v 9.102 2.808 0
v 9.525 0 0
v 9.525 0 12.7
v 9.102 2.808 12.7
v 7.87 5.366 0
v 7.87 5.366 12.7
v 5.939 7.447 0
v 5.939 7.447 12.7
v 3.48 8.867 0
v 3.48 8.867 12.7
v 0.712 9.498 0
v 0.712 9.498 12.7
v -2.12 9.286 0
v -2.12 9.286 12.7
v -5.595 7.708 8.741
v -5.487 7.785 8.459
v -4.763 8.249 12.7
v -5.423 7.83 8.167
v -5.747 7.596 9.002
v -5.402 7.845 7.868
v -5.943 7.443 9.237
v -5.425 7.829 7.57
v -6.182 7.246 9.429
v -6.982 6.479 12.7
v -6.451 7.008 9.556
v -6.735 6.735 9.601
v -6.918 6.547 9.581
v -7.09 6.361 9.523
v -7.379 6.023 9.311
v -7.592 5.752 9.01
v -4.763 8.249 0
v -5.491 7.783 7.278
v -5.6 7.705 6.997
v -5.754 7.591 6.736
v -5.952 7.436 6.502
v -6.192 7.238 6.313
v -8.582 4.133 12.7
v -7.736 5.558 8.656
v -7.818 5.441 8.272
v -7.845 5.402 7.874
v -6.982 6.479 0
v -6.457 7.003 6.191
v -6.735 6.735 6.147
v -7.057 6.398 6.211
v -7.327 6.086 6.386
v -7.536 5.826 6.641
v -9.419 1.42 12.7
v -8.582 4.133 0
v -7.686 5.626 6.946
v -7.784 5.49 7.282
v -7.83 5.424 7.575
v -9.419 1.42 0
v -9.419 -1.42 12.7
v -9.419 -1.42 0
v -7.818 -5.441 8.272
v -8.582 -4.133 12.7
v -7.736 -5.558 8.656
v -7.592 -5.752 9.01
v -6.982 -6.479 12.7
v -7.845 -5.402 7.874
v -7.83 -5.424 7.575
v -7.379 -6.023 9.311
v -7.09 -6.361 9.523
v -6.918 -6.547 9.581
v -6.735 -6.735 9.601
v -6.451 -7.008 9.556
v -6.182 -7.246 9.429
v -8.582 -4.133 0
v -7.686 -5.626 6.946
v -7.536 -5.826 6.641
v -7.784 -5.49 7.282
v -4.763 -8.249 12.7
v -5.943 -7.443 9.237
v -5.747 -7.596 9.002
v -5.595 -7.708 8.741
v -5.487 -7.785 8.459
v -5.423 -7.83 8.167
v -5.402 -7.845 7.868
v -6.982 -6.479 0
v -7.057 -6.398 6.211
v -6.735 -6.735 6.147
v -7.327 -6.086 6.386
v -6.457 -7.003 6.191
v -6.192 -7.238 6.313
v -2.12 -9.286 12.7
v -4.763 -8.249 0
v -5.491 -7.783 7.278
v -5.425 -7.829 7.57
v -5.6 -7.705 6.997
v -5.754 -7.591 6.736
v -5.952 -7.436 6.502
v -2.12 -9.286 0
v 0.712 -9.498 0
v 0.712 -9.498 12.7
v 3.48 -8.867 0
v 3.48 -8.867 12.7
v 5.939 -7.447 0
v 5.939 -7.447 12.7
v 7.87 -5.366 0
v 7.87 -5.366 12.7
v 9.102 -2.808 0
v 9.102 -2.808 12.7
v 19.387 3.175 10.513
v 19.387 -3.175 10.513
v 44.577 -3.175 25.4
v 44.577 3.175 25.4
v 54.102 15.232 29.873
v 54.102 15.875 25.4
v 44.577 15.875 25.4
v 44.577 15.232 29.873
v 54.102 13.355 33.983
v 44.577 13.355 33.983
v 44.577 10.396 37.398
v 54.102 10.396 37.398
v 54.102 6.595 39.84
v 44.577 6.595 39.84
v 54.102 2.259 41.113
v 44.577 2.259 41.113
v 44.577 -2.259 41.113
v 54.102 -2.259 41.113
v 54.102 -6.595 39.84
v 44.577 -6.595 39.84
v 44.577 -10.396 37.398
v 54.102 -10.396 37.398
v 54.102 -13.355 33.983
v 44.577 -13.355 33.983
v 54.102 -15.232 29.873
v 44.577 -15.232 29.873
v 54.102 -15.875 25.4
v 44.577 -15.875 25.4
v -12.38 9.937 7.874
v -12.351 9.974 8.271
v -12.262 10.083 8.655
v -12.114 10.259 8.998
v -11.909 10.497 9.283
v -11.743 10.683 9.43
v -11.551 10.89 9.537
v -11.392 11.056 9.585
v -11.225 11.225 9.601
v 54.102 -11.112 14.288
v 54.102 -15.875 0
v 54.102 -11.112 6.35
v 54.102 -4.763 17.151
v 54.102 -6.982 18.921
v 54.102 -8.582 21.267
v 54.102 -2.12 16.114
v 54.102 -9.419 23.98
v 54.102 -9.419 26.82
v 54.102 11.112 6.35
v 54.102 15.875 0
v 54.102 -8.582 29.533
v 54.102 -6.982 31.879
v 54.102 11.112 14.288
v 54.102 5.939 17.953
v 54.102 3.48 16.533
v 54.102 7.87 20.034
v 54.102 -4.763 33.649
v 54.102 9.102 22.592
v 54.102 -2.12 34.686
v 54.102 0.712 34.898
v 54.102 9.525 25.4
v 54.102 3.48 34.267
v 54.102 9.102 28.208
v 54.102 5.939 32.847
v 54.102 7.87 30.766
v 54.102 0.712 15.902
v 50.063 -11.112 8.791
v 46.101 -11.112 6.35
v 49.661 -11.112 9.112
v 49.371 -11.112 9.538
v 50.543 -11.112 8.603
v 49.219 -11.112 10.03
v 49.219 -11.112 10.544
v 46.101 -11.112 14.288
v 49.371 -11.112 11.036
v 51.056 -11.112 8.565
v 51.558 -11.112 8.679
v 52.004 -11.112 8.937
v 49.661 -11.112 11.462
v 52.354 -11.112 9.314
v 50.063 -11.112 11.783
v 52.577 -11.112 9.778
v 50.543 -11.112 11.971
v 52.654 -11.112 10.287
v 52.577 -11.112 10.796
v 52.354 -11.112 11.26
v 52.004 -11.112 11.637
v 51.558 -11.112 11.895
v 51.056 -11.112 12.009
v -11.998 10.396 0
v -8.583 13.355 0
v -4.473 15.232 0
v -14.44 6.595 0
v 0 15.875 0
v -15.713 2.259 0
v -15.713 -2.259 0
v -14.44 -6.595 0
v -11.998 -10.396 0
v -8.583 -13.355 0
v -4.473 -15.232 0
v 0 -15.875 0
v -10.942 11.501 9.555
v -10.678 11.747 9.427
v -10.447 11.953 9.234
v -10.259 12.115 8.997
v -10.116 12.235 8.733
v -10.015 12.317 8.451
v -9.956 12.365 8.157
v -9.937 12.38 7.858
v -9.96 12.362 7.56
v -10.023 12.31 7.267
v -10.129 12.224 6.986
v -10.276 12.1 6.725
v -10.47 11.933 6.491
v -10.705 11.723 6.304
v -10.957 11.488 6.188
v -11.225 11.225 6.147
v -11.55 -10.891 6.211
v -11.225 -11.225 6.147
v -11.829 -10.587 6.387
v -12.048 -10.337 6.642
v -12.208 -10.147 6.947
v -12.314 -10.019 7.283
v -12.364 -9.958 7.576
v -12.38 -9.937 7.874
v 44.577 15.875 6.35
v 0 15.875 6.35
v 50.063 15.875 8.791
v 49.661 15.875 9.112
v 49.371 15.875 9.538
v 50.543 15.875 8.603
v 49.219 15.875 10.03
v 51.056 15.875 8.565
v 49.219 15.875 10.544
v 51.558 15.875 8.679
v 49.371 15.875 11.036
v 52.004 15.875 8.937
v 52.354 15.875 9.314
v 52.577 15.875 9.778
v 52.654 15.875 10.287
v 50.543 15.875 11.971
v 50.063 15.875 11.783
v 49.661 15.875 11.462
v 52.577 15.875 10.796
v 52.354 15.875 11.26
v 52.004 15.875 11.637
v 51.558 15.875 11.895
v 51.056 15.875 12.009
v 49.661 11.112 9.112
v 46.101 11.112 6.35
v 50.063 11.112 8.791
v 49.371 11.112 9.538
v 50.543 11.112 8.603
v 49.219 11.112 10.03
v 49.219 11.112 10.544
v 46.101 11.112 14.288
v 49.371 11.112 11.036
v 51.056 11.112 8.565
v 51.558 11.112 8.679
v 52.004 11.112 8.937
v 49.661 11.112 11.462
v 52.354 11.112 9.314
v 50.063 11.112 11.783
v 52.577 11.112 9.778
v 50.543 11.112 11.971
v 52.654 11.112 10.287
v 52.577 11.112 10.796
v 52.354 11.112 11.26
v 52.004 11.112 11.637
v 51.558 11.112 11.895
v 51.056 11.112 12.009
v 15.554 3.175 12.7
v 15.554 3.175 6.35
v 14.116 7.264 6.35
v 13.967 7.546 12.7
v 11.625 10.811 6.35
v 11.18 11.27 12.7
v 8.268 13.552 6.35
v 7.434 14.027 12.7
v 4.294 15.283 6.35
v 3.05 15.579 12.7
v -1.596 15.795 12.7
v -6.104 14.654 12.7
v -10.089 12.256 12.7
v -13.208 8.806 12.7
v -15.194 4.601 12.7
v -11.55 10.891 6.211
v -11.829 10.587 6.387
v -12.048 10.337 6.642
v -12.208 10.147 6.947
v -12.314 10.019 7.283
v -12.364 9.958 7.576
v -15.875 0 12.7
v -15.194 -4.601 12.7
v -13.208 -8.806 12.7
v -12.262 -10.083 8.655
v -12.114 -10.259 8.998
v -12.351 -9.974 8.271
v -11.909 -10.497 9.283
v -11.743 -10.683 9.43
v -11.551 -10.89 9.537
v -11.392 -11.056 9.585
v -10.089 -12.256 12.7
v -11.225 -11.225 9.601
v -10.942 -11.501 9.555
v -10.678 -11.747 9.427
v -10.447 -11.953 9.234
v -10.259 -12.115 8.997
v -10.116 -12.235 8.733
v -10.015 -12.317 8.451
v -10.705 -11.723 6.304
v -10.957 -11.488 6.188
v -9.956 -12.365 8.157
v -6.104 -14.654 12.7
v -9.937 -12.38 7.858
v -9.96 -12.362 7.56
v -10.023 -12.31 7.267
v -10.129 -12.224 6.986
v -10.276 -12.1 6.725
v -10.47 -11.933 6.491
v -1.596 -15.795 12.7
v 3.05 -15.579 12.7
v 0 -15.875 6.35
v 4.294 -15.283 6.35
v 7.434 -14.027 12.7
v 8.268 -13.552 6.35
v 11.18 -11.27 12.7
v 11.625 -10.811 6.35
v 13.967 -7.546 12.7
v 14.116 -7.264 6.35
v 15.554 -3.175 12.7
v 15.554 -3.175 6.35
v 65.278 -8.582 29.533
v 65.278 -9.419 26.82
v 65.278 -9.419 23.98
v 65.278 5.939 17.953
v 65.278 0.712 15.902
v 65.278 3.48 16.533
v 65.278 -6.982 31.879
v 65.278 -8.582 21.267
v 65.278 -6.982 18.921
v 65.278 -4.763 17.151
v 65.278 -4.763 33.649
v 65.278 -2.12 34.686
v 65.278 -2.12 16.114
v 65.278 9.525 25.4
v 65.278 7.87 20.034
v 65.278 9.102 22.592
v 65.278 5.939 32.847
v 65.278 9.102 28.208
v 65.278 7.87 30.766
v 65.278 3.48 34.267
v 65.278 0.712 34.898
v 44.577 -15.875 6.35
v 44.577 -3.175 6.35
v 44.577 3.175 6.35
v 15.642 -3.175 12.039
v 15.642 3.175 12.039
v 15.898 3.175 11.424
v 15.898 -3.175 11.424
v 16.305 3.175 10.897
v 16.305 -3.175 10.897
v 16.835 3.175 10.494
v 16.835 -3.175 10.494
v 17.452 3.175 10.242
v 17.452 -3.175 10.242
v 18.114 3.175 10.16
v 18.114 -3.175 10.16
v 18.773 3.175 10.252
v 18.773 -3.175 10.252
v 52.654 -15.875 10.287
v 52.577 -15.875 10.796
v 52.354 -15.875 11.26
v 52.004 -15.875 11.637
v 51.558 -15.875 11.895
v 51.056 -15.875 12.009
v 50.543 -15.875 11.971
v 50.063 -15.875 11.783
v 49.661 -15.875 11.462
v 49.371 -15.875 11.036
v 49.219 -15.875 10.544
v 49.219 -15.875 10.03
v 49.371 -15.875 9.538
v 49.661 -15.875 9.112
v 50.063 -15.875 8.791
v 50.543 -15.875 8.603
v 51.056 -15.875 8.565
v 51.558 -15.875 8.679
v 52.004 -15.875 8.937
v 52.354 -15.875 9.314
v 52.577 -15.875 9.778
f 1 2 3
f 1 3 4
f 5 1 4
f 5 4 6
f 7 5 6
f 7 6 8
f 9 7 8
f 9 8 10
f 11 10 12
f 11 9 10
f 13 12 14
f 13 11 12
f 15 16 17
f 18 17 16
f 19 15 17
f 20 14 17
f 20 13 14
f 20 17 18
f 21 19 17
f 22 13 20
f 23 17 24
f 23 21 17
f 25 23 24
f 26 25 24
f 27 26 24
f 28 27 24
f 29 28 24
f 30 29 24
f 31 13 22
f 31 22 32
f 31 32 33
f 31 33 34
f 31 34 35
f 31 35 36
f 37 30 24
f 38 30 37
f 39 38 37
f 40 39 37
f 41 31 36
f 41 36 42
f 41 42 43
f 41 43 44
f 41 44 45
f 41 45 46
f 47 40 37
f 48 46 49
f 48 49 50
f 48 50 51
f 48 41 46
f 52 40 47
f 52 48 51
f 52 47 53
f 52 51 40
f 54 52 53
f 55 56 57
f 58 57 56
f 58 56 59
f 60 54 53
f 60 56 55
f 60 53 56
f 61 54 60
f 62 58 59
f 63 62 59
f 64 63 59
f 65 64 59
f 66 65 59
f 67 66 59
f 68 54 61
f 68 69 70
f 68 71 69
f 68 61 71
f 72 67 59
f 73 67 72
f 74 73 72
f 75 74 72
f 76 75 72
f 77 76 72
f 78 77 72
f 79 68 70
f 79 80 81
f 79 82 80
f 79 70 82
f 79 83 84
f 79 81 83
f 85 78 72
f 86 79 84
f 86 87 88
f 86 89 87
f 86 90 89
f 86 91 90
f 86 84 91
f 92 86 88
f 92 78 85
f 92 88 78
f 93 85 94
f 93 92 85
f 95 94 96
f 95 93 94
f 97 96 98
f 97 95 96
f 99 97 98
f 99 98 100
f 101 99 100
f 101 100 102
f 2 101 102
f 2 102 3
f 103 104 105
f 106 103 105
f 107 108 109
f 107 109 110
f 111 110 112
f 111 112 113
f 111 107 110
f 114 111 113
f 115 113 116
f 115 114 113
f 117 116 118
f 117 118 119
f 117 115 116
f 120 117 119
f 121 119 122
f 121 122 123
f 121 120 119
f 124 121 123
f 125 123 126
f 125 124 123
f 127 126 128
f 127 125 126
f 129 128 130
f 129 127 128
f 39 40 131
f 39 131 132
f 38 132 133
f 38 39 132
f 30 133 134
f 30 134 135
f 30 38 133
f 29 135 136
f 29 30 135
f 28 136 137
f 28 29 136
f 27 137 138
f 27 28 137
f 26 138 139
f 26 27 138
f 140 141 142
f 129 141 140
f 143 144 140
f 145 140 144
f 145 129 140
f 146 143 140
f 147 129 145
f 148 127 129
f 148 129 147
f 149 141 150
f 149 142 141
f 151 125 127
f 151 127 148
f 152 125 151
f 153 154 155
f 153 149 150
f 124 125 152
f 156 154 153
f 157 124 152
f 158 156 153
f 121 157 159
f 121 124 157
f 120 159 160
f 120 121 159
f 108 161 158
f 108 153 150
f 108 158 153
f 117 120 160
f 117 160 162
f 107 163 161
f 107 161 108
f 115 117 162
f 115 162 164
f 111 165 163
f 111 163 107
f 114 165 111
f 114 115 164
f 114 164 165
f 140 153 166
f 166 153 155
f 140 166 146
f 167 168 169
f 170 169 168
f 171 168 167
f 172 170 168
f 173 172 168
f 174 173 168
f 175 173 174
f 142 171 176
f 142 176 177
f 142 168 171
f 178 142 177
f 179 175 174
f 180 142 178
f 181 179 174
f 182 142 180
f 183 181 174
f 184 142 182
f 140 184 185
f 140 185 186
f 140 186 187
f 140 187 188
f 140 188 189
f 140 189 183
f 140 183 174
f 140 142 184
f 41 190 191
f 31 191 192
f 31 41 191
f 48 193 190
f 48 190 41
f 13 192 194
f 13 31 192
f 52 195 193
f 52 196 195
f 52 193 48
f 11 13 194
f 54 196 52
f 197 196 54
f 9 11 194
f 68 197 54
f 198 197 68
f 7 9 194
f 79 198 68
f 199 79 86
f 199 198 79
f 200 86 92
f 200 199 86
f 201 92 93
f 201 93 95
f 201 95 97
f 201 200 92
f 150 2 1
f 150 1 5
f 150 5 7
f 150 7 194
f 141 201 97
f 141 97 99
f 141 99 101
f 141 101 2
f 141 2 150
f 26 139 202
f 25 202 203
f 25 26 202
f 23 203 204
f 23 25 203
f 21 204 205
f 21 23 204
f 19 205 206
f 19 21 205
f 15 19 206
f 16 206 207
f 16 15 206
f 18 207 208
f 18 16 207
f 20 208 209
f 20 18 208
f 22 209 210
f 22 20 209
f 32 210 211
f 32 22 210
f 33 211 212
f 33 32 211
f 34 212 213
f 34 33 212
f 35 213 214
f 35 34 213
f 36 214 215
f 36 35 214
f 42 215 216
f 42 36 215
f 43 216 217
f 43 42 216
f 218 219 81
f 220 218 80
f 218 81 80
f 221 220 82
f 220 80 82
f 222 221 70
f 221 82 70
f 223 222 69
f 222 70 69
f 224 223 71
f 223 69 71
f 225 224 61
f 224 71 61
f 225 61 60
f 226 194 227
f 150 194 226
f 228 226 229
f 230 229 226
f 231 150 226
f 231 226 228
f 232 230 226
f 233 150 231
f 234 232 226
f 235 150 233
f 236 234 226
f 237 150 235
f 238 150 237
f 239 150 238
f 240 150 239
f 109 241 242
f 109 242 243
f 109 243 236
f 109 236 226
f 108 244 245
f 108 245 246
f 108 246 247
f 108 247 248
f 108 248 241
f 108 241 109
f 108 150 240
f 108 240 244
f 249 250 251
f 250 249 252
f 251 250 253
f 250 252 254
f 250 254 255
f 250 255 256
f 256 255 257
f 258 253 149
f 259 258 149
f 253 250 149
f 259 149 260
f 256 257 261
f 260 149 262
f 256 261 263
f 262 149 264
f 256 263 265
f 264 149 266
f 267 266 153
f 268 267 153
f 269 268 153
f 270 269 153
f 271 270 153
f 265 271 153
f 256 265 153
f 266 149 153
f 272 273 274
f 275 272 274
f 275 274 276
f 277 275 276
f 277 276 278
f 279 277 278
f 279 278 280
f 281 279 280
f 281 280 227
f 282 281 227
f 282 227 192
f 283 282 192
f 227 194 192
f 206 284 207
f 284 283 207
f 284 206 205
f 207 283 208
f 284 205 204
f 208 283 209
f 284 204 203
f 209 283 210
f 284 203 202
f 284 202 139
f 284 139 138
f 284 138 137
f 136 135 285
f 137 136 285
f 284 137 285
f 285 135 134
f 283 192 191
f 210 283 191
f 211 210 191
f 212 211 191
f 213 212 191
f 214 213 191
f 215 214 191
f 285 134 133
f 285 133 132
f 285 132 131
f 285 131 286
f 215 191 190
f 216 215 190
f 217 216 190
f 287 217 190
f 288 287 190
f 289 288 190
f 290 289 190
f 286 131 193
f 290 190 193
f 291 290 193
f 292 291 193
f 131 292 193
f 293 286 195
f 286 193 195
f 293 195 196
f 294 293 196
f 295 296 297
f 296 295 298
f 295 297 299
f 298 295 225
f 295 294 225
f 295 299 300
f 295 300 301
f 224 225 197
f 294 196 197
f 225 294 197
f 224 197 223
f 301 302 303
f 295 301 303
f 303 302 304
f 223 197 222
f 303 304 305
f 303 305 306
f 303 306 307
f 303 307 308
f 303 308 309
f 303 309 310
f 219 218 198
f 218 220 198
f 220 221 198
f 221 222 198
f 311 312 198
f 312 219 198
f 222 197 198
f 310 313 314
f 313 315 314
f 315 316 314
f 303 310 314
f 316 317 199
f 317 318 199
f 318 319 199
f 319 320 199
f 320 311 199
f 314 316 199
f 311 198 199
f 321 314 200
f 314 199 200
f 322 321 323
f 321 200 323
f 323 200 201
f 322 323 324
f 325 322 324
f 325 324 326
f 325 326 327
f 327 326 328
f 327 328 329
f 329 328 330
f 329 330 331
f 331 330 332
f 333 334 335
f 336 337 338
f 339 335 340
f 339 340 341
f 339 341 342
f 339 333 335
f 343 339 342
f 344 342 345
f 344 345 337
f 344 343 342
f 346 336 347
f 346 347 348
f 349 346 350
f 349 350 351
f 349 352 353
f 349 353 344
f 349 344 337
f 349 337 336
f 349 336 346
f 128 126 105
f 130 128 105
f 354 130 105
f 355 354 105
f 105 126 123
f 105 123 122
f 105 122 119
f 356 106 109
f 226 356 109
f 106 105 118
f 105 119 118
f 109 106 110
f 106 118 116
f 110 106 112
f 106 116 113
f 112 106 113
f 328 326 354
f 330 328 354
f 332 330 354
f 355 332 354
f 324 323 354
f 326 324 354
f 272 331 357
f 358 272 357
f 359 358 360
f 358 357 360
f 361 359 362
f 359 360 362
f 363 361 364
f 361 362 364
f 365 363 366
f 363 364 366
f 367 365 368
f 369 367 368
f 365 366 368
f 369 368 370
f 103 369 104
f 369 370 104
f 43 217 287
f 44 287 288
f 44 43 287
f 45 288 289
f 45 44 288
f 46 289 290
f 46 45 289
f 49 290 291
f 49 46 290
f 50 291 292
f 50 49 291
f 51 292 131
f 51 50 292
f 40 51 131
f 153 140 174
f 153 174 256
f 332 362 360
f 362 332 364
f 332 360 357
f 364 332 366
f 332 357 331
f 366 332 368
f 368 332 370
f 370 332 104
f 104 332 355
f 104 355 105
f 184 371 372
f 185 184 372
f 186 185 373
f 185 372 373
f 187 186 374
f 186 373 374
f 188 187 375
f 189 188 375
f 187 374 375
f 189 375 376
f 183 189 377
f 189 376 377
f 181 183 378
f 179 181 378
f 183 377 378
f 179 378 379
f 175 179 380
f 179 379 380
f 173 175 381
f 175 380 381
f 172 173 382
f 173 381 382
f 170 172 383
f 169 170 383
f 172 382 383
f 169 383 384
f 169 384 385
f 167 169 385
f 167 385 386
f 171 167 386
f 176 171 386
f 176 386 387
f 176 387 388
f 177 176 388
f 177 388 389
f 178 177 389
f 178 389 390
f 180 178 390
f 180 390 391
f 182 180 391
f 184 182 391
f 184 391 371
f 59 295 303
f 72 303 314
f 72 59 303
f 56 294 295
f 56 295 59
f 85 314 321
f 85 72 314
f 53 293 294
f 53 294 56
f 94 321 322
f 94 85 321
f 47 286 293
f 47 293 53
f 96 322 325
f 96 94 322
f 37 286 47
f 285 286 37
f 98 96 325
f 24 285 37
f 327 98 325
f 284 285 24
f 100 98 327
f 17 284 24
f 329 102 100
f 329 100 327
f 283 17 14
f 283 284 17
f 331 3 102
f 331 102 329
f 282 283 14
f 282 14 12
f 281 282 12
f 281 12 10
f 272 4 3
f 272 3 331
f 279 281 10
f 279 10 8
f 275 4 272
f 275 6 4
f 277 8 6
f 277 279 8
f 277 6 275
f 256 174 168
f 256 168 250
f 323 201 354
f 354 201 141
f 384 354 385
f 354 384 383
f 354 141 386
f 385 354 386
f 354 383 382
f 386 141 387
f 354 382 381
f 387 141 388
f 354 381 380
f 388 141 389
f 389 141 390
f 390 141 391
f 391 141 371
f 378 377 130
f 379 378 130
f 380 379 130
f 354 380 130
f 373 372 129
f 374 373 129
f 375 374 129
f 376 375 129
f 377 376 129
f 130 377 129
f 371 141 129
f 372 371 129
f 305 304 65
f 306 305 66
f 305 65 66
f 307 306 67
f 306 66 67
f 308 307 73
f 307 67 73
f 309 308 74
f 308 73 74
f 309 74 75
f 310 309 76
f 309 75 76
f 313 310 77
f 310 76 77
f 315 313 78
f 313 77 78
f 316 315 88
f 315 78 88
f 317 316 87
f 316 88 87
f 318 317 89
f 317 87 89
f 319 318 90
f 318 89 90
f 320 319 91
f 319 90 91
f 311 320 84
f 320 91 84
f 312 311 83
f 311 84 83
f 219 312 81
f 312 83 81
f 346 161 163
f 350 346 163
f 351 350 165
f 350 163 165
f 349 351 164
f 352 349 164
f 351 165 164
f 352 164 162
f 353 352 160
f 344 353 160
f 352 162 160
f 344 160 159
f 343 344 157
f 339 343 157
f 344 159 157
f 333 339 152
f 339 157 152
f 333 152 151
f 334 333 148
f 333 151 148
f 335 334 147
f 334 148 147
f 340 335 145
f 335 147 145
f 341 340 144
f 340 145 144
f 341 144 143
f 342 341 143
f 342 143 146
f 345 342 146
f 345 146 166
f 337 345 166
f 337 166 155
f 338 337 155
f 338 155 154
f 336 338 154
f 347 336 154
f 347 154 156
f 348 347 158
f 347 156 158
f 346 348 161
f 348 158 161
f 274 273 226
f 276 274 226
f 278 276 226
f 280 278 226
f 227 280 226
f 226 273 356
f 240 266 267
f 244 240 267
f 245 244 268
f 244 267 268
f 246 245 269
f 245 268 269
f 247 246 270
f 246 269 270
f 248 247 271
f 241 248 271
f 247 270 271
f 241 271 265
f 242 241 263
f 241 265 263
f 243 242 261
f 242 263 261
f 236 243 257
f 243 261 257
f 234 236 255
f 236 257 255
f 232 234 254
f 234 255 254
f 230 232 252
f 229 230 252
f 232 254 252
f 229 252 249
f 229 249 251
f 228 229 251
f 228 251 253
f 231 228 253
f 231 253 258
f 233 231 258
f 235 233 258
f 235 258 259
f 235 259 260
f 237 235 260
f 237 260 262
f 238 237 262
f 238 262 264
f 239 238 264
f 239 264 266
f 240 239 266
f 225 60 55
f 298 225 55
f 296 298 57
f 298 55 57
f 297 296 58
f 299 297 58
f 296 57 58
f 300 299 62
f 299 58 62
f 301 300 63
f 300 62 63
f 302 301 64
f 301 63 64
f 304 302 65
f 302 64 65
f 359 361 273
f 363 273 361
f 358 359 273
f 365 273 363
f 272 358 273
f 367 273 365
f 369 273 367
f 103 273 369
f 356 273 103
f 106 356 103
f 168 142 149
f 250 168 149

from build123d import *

# Parameters (mm, degrees)
F0_R           = 15.875
F0_R_2         = 9.525
F1_DEPTH       = 12.7
F5_DEPTH       = 25.4
F7_DEPTH       = 25.4
F9_DEPTH       = 6.35
F11_W          = 31.75
F11_H          = 19.05
F12_DEPTH      = 9.525
F14_END_RADIUS = 15.875
F13_W          = 3.175
F13_H          = 19.05
F14_REACH      = 79.7657711337
F16_DEPTH      = 25.4
F17_R          = 9.525
F18_DEPTH      = 11.176
F19_W          = 22.225
F19_H          = 7.9375
F20_DEPTH      = 8.001
F21_R          = 1.7272
F22_DEPTH      = 101.6


with BuildPart() as f1:
    # F0 (on Top) → F1 (new body)
    with BuildSketch(Plane.XY):
        Circle(F0_R)
        Circle(F0_R_2, mode=Mode.SUBTRACT)
    extrude(amount=F1_DEPTH)

    # F4 (on face) → F5 (cut)
    with BuildSketch(Plane(origin=(0, 0, 0), x_dir=(-0.7071067812, 0.7071067812, 0), z_dir=(0.7071067812, 0.7071067812, 0))):
        with BuildLine():
            ThreePointArc((0, 6.1468), (1.2213148325, 6.6526851675), (1.7272, 7.874))
            ThreePointArc((1.7272, 7.874), (1.2213148325, 9.0953148325), (0, 9.6012))
            Line((0, 9.6012), (0, 6.1468))
        make_face()
        with BuildLine():
            Line((0, 6.1468), (0, 9.6012))
            ThreePointArc((0, 9.6012), (-1.7272, 7.874), (0, 6.1468))
        make_face()
    extrude(amount=-F5_DEPTH, mode=Mode.SUBTRACT)

    # F6 (on face) → F7 (cut)
    with BuildSketch(Plane(origin=(0, 0, 0), x_dir=(-0.7071067812, -0.7071067812, 0), z_dir=(-0.7071067812, 0.7071067812, 0))):
        with BuildLine():
            ThreePointArc((0, 6.1468), (1.2213148325, 6.6526851675), (1.7272, 7.874))
            ThreePointArc((1.7272, 7.874), (1.2213148325, 9.0953148325), (0, 9.6012))
            Line((0, 9.6012), (0, 6.1468))
        make_face()
        with BuildLine():
            Line((0, 6.1468), (0, 9.6012))
            ThreePointArc((0, 9.6012), (-1.7272, 7.874), (0, 6.1468))
        make_face()
    extrude(amount=F7_DEPTH, mode=Mode.SUBTRACT)

    # F8 (on face) → F9 (join)
    with BuildSketch(Plane(origin=(0, 0, 0), x_dir=(1, 0, 0), z_dir=(0, 0, -1))):
        with BuildLine():
            Line((54.102, 15.875), (0, 15.875))
            ThreePointArc((0, 15.875), (11.2253201513, 11.2253201513), (15.875, 0))
            ThreePointArc((15.875, 0), (11.2253201513, -11.2253201513), (0, -15.875))
            Line((0, -15.875), (54.102, -15.875))
            Line((54.102, -15.875), (54.102, 15.875))
        make_face()
    extrude(amount=-F9_DEPTH)

    # F11 (on offset) → F12 (join)
    with BuildSketch(Plane.YZ.offset(54.102)):
        with Locations((0, 15.875)):
            Rectangle(F11_W, F11_H)
        with BuildLine():
            ThreePointArc((15.875, 25.4), (0, 41.275), (-15.875, 25.4))
            Line((-15.875, 25.4), (15.875, 25.4))
        make_face()
    extrude(amount=-F12_DEPTH)

    f14_end = (Plane(origin=(0, 0, 6.35), x_dir=(-1, 0, 0), z_dir=(0, 0, -1)) * Cylinder(F14_END_RADIUS, 333.9846154871, mode=Mode.PRIVATE)).faces().sort_by_distance((-15.875, 0, 6.35))[0]
    # F13 (on face) → F14 (join, up to the whole of a round face its end follows)
    with BuildSketch(Plane(origin=(44.577, 0, 0), x_dir=(0, -1, 0), z_dir=(-1, 0, 0))):
        with Locations((-1.5875, 15.875)):
            Rectangle(F13_W, F13_H)
        with Locations((1.5875, 15.875)):
            Rectangle(F13_W, F13_H)
    f14_long = extrude(amount=F14_REACH, mode=Mode.PRIVATE)
    add(split(f14_long, bisect_by=f14_end, keep=Keep.ALL, mode=Mode.PRIVATE).solids().sort_by_distance((44.577, 0, 15.875))[0])

    # F15 (on face) → F16 (cut)
    with BuildSketch(Plane.XZ.offset(3.175)):
        with BuildLine():
            Line((19.3865235489, 10.5133005292), (44.577, 25.4))
            Line((44.577, 25.4), (15.5542598667, 25.4))
            Line((15.5542598667, 25.4), (15.5542598667, 12.7))
            ThreePointArc((15.5542598667, 12.7), (16.8354409267, 10.4938778646), (19.3865235489, 10.5133005292))
        make_face()
    extrude(amount=-F16_DEPTH, mode=Mode.SUBTRACT)

    # F17 (on face) → F18 (join)
    with BuildSketch(Plane.YZ.offset(54.102)):
        with Locations((0, 25.4)):
            Circle(F17_R)
    extrude(amount=F18_DEPTH)

    # F19 (on face) → F20 (cut)
    with BuildSketch(Plane.YZ.offset(54.102)):
        with Locations((0, 10.31875)):
            Rectangle(F19_W, F19_H)
    extrude(amount=-F20_DEPTH, mode=Mode.SUBTRACT)

    # F21 (on face) → F22 (cut)
    with BuildSketch(Plane.XZ.offset(15.875)):
        with Locations((50.927, 10.287)):
            Circle(F21_R)
    extrude(amount=-F22_DEPTH, mode=Mode.SUBTRACT)


solid = f1.part
